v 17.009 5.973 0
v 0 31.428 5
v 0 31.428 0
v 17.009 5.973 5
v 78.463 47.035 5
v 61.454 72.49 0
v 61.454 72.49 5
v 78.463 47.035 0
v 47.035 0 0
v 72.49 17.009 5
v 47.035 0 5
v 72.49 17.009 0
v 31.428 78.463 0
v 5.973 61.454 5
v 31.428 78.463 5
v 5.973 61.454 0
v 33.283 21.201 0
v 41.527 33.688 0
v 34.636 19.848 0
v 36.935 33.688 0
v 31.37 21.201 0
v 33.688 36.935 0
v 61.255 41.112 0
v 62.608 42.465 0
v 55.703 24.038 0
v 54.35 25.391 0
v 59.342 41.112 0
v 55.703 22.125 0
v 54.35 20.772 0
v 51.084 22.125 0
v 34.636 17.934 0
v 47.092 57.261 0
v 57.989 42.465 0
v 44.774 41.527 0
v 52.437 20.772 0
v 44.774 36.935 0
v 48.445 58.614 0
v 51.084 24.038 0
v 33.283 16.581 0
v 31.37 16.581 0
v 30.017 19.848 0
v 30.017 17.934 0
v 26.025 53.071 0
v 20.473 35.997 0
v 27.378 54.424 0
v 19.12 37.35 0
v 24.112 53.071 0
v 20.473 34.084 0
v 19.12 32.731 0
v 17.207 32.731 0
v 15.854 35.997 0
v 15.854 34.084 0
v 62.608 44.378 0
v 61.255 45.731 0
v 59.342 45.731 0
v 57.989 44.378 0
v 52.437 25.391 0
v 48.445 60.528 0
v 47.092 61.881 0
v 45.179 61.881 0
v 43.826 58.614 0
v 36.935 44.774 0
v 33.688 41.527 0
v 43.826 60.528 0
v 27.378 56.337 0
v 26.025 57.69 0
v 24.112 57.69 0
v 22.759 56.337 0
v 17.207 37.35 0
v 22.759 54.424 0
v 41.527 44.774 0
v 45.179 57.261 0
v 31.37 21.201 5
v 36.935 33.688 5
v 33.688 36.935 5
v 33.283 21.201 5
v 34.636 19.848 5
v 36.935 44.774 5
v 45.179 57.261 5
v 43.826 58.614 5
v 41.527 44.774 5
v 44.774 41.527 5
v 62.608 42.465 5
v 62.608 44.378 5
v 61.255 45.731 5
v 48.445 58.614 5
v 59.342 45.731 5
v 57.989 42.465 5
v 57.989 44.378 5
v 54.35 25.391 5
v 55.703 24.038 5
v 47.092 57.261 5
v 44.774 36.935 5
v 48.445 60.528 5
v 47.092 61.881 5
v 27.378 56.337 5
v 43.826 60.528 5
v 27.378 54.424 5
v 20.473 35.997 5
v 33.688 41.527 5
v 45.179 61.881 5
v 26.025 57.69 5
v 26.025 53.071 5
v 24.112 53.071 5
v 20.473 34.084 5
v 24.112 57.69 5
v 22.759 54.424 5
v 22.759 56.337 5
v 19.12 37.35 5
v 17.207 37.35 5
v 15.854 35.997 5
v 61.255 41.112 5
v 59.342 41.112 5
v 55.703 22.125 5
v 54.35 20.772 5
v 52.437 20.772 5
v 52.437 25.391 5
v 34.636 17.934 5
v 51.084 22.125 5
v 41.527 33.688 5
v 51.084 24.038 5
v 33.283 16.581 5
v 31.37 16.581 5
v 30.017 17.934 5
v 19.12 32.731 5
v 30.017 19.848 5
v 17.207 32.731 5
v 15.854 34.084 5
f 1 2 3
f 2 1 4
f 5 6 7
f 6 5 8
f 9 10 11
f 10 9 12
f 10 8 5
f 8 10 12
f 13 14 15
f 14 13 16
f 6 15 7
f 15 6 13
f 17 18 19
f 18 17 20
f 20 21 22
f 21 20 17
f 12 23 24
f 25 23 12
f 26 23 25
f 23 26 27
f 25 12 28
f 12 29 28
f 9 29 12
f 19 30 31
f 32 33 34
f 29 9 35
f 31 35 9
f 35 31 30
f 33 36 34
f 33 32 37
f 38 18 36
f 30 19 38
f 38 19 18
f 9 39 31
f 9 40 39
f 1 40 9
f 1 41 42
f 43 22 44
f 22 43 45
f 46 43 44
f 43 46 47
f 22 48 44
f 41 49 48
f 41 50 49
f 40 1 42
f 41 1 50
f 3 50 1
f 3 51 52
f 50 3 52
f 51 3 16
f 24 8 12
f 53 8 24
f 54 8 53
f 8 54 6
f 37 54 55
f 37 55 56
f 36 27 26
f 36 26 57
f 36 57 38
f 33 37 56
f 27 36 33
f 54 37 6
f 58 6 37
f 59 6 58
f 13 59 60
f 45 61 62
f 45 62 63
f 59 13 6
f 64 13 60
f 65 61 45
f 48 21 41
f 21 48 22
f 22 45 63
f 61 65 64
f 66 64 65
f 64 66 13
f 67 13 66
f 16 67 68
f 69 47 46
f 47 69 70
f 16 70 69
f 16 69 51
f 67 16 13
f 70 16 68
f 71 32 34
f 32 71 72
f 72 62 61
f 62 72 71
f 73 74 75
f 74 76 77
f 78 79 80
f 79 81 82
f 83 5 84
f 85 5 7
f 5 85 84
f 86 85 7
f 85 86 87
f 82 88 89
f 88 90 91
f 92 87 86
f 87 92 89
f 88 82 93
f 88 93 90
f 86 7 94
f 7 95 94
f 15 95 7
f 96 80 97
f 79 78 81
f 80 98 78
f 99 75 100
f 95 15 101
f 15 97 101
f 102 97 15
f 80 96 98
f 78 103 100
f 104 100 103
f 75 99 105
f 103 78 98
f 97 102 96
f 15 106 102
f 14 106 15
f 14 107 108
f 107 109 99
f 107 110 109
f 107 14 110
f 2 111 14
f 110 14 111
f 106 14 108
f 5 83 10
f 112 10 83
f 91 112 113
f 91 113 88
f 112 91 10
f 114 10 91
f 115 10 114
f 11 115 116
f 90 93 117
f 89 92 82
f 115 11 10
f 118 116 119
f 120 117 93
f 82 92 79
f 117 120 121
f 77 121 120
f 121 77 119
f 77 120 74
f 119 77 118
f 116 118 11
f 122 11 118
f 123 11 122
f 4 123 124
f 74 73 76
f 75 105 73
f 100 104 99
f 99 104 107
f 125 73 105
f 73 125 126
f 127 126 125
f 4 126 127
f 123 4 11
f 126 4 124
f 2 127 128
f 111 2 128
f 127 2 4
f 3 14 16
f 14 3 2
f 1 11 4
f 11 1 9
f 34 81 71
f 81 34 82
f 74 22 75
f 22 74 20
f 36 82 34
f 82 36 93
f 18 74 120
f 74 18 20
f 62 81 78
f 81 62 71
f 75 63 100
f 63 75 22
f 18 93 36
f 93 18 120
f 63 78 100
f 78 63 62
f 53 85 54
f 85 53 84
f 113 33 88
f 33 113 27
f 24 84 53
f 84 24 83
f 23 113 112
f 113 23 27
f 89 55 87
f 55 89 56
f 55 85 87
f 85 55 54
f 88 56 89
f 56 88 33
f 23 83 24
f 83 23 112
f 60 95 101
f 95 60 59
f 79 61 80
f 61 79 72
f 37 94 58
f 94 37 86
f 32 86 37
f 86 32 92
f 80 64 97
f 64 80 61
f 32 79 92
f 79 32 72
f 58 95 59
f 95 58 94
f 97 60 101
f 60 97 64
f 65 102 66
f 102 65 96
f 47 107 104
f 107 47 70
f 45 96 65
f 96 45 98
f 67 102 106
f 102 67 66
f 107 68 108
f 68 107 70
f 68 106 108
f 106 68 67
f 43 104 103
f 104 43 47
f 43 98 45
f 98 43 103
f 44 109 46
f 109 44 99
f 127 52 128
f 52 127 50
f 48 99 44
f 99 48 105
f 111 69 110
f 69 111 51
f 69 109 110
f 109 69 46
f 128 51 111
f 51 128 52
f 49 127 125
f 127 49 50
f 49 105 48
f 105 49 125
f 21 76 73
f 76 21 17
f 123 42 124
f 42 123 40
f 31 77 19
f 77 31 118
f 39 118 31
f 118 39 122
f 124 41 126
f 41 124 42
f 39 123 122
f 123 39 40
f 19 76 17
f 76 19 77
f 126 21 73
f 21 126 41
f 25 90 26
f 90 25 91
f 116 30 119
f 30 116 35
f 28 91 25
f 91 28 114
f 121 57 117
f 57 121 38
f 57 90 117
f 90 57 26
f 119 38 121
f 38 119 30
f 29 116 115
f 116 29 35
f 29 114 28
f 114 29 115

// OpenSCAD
$fn = 32;

// ----------------------------------------------------------------------
// Polygon plate: 8-gon R40, 6 bolt windows
// ----------------------------------------------------------------------

// --- parameters (mm) ---
sides = 8;                // number of polygon sides
plate_r = 40;             // circumscribed radius of the polygon
bore_r = 6;               // centre bore radius
bolts = 6;                // number of bolt windows
ring_r = 21.48;           // bolt-circle radius
bolt_r = 2.5;             // bolt window radius
plate_t = 5;              // plate thickness, Z (extrusion height)

plate_d = 2 * plate_r;  // circumscribed diameter
bore_d = 2 * bore_r;  // centre bore diameter
bolt_d = 2 * bolt_r;  // bolt window diameter
ring_d = 2 * ring_r;  // bolt-circle diameter

profile = [[78.463, 47.035], [61.454, 72.49], [31.428, 78.463], [5.973, 61.454], [0, 31.428], [17.009, 5.973], [47.035, 0], [72.49, 17.009]];  // primary outline, 8 points, counter clockwise
void_1 = [[44.774, 41.527], [41.527, 44.774], [36.935, 44.774], [33.688, 41.527], [33.688, 36.935], [36.935, 33.688], [41.527, 33.688], [44.774, 36.935]];  // centre bore, 8 points
void_2 = [[62.608, 44.378], [61.255, 45.731], [59.342, 45.731], [57.989, 44.378], [57.989, 42.465], [59.342, 41.112], [61.255, 41.112], [62.608, 42.465]];  // bolt window 1, 8 points
void_3 = [[48.445, 60.528], [47.092, 61.881], [45.179, 61.881], [43.826, 60.528], [43.826, 58.614], [45.179, 57.261], [47.092, 57.261], [48.445, 58.614]];  // bolt window 2, 8 points
void_4 = [[27.378, 56.337], [26.025, 57.69], [24.112, 57.69], [22.759, 56.337], [22.759, 54.424], [24.112, 53.071], [26.025, 53.071], [27.378, 54.424]];  // bolt window 3, 8 points
void_5 = [[20.473, 35.997], [19.12, 37.35], [17.207, 37.35], [15.854, 35.997], [15.854, 34.084], [17.207, 32.731], [19.12, 32.731], [20.473, 34.084]];  // bolt window 4, 8 points
void_6 = [[34.636, 19.848], [33.283, 21.201], [31.37, 21.201], [30.017, 19.848], [30.017, 17.934], [31.37, 16.581], [33.283, 16.581], [34.636, 17.934]];  // bolt window 5, 8 points
void_7 = [[55.703, 24.038], [54.35, 25.391], [52.437, 25.391], [51.084, 24.038], [51.084, 22.125], [52.437, 20.772], [54.35, 20.772], [55.703, 22.125]];  // bolt window 6, 8 points

// --- the one profile operation ---
difference() {
  linear_extrude(height = plate_t) polygon(points = profile);
  translate([0, 0, -1])
    linear_extrude(height = plate_t + 2) polygon(points = void_1);
  translate([0, 0, -1])
    linear_extrude(height = plate_t + 2) polygon(points = void_2);
  translate([0, 0, -1])
    linear_extrude(height = plate_t + 2) polygon(points = void_3);
  translate([0, 0, -1])
    linear_extrude(height = plate_t + 2) polygon(points = void_4);
  translate([0, 0, -1])
    linear_extrude(height = plate_t + 2) polygon(points = void_5);
  translate([0, 0, -1])
    linear_extrude(height = plate_t + 2) polygon(points = void_6);
  translate([0, 0, -1])
    linear_extrude(height = plate_t + 2) polygon(points = void_7);
}
